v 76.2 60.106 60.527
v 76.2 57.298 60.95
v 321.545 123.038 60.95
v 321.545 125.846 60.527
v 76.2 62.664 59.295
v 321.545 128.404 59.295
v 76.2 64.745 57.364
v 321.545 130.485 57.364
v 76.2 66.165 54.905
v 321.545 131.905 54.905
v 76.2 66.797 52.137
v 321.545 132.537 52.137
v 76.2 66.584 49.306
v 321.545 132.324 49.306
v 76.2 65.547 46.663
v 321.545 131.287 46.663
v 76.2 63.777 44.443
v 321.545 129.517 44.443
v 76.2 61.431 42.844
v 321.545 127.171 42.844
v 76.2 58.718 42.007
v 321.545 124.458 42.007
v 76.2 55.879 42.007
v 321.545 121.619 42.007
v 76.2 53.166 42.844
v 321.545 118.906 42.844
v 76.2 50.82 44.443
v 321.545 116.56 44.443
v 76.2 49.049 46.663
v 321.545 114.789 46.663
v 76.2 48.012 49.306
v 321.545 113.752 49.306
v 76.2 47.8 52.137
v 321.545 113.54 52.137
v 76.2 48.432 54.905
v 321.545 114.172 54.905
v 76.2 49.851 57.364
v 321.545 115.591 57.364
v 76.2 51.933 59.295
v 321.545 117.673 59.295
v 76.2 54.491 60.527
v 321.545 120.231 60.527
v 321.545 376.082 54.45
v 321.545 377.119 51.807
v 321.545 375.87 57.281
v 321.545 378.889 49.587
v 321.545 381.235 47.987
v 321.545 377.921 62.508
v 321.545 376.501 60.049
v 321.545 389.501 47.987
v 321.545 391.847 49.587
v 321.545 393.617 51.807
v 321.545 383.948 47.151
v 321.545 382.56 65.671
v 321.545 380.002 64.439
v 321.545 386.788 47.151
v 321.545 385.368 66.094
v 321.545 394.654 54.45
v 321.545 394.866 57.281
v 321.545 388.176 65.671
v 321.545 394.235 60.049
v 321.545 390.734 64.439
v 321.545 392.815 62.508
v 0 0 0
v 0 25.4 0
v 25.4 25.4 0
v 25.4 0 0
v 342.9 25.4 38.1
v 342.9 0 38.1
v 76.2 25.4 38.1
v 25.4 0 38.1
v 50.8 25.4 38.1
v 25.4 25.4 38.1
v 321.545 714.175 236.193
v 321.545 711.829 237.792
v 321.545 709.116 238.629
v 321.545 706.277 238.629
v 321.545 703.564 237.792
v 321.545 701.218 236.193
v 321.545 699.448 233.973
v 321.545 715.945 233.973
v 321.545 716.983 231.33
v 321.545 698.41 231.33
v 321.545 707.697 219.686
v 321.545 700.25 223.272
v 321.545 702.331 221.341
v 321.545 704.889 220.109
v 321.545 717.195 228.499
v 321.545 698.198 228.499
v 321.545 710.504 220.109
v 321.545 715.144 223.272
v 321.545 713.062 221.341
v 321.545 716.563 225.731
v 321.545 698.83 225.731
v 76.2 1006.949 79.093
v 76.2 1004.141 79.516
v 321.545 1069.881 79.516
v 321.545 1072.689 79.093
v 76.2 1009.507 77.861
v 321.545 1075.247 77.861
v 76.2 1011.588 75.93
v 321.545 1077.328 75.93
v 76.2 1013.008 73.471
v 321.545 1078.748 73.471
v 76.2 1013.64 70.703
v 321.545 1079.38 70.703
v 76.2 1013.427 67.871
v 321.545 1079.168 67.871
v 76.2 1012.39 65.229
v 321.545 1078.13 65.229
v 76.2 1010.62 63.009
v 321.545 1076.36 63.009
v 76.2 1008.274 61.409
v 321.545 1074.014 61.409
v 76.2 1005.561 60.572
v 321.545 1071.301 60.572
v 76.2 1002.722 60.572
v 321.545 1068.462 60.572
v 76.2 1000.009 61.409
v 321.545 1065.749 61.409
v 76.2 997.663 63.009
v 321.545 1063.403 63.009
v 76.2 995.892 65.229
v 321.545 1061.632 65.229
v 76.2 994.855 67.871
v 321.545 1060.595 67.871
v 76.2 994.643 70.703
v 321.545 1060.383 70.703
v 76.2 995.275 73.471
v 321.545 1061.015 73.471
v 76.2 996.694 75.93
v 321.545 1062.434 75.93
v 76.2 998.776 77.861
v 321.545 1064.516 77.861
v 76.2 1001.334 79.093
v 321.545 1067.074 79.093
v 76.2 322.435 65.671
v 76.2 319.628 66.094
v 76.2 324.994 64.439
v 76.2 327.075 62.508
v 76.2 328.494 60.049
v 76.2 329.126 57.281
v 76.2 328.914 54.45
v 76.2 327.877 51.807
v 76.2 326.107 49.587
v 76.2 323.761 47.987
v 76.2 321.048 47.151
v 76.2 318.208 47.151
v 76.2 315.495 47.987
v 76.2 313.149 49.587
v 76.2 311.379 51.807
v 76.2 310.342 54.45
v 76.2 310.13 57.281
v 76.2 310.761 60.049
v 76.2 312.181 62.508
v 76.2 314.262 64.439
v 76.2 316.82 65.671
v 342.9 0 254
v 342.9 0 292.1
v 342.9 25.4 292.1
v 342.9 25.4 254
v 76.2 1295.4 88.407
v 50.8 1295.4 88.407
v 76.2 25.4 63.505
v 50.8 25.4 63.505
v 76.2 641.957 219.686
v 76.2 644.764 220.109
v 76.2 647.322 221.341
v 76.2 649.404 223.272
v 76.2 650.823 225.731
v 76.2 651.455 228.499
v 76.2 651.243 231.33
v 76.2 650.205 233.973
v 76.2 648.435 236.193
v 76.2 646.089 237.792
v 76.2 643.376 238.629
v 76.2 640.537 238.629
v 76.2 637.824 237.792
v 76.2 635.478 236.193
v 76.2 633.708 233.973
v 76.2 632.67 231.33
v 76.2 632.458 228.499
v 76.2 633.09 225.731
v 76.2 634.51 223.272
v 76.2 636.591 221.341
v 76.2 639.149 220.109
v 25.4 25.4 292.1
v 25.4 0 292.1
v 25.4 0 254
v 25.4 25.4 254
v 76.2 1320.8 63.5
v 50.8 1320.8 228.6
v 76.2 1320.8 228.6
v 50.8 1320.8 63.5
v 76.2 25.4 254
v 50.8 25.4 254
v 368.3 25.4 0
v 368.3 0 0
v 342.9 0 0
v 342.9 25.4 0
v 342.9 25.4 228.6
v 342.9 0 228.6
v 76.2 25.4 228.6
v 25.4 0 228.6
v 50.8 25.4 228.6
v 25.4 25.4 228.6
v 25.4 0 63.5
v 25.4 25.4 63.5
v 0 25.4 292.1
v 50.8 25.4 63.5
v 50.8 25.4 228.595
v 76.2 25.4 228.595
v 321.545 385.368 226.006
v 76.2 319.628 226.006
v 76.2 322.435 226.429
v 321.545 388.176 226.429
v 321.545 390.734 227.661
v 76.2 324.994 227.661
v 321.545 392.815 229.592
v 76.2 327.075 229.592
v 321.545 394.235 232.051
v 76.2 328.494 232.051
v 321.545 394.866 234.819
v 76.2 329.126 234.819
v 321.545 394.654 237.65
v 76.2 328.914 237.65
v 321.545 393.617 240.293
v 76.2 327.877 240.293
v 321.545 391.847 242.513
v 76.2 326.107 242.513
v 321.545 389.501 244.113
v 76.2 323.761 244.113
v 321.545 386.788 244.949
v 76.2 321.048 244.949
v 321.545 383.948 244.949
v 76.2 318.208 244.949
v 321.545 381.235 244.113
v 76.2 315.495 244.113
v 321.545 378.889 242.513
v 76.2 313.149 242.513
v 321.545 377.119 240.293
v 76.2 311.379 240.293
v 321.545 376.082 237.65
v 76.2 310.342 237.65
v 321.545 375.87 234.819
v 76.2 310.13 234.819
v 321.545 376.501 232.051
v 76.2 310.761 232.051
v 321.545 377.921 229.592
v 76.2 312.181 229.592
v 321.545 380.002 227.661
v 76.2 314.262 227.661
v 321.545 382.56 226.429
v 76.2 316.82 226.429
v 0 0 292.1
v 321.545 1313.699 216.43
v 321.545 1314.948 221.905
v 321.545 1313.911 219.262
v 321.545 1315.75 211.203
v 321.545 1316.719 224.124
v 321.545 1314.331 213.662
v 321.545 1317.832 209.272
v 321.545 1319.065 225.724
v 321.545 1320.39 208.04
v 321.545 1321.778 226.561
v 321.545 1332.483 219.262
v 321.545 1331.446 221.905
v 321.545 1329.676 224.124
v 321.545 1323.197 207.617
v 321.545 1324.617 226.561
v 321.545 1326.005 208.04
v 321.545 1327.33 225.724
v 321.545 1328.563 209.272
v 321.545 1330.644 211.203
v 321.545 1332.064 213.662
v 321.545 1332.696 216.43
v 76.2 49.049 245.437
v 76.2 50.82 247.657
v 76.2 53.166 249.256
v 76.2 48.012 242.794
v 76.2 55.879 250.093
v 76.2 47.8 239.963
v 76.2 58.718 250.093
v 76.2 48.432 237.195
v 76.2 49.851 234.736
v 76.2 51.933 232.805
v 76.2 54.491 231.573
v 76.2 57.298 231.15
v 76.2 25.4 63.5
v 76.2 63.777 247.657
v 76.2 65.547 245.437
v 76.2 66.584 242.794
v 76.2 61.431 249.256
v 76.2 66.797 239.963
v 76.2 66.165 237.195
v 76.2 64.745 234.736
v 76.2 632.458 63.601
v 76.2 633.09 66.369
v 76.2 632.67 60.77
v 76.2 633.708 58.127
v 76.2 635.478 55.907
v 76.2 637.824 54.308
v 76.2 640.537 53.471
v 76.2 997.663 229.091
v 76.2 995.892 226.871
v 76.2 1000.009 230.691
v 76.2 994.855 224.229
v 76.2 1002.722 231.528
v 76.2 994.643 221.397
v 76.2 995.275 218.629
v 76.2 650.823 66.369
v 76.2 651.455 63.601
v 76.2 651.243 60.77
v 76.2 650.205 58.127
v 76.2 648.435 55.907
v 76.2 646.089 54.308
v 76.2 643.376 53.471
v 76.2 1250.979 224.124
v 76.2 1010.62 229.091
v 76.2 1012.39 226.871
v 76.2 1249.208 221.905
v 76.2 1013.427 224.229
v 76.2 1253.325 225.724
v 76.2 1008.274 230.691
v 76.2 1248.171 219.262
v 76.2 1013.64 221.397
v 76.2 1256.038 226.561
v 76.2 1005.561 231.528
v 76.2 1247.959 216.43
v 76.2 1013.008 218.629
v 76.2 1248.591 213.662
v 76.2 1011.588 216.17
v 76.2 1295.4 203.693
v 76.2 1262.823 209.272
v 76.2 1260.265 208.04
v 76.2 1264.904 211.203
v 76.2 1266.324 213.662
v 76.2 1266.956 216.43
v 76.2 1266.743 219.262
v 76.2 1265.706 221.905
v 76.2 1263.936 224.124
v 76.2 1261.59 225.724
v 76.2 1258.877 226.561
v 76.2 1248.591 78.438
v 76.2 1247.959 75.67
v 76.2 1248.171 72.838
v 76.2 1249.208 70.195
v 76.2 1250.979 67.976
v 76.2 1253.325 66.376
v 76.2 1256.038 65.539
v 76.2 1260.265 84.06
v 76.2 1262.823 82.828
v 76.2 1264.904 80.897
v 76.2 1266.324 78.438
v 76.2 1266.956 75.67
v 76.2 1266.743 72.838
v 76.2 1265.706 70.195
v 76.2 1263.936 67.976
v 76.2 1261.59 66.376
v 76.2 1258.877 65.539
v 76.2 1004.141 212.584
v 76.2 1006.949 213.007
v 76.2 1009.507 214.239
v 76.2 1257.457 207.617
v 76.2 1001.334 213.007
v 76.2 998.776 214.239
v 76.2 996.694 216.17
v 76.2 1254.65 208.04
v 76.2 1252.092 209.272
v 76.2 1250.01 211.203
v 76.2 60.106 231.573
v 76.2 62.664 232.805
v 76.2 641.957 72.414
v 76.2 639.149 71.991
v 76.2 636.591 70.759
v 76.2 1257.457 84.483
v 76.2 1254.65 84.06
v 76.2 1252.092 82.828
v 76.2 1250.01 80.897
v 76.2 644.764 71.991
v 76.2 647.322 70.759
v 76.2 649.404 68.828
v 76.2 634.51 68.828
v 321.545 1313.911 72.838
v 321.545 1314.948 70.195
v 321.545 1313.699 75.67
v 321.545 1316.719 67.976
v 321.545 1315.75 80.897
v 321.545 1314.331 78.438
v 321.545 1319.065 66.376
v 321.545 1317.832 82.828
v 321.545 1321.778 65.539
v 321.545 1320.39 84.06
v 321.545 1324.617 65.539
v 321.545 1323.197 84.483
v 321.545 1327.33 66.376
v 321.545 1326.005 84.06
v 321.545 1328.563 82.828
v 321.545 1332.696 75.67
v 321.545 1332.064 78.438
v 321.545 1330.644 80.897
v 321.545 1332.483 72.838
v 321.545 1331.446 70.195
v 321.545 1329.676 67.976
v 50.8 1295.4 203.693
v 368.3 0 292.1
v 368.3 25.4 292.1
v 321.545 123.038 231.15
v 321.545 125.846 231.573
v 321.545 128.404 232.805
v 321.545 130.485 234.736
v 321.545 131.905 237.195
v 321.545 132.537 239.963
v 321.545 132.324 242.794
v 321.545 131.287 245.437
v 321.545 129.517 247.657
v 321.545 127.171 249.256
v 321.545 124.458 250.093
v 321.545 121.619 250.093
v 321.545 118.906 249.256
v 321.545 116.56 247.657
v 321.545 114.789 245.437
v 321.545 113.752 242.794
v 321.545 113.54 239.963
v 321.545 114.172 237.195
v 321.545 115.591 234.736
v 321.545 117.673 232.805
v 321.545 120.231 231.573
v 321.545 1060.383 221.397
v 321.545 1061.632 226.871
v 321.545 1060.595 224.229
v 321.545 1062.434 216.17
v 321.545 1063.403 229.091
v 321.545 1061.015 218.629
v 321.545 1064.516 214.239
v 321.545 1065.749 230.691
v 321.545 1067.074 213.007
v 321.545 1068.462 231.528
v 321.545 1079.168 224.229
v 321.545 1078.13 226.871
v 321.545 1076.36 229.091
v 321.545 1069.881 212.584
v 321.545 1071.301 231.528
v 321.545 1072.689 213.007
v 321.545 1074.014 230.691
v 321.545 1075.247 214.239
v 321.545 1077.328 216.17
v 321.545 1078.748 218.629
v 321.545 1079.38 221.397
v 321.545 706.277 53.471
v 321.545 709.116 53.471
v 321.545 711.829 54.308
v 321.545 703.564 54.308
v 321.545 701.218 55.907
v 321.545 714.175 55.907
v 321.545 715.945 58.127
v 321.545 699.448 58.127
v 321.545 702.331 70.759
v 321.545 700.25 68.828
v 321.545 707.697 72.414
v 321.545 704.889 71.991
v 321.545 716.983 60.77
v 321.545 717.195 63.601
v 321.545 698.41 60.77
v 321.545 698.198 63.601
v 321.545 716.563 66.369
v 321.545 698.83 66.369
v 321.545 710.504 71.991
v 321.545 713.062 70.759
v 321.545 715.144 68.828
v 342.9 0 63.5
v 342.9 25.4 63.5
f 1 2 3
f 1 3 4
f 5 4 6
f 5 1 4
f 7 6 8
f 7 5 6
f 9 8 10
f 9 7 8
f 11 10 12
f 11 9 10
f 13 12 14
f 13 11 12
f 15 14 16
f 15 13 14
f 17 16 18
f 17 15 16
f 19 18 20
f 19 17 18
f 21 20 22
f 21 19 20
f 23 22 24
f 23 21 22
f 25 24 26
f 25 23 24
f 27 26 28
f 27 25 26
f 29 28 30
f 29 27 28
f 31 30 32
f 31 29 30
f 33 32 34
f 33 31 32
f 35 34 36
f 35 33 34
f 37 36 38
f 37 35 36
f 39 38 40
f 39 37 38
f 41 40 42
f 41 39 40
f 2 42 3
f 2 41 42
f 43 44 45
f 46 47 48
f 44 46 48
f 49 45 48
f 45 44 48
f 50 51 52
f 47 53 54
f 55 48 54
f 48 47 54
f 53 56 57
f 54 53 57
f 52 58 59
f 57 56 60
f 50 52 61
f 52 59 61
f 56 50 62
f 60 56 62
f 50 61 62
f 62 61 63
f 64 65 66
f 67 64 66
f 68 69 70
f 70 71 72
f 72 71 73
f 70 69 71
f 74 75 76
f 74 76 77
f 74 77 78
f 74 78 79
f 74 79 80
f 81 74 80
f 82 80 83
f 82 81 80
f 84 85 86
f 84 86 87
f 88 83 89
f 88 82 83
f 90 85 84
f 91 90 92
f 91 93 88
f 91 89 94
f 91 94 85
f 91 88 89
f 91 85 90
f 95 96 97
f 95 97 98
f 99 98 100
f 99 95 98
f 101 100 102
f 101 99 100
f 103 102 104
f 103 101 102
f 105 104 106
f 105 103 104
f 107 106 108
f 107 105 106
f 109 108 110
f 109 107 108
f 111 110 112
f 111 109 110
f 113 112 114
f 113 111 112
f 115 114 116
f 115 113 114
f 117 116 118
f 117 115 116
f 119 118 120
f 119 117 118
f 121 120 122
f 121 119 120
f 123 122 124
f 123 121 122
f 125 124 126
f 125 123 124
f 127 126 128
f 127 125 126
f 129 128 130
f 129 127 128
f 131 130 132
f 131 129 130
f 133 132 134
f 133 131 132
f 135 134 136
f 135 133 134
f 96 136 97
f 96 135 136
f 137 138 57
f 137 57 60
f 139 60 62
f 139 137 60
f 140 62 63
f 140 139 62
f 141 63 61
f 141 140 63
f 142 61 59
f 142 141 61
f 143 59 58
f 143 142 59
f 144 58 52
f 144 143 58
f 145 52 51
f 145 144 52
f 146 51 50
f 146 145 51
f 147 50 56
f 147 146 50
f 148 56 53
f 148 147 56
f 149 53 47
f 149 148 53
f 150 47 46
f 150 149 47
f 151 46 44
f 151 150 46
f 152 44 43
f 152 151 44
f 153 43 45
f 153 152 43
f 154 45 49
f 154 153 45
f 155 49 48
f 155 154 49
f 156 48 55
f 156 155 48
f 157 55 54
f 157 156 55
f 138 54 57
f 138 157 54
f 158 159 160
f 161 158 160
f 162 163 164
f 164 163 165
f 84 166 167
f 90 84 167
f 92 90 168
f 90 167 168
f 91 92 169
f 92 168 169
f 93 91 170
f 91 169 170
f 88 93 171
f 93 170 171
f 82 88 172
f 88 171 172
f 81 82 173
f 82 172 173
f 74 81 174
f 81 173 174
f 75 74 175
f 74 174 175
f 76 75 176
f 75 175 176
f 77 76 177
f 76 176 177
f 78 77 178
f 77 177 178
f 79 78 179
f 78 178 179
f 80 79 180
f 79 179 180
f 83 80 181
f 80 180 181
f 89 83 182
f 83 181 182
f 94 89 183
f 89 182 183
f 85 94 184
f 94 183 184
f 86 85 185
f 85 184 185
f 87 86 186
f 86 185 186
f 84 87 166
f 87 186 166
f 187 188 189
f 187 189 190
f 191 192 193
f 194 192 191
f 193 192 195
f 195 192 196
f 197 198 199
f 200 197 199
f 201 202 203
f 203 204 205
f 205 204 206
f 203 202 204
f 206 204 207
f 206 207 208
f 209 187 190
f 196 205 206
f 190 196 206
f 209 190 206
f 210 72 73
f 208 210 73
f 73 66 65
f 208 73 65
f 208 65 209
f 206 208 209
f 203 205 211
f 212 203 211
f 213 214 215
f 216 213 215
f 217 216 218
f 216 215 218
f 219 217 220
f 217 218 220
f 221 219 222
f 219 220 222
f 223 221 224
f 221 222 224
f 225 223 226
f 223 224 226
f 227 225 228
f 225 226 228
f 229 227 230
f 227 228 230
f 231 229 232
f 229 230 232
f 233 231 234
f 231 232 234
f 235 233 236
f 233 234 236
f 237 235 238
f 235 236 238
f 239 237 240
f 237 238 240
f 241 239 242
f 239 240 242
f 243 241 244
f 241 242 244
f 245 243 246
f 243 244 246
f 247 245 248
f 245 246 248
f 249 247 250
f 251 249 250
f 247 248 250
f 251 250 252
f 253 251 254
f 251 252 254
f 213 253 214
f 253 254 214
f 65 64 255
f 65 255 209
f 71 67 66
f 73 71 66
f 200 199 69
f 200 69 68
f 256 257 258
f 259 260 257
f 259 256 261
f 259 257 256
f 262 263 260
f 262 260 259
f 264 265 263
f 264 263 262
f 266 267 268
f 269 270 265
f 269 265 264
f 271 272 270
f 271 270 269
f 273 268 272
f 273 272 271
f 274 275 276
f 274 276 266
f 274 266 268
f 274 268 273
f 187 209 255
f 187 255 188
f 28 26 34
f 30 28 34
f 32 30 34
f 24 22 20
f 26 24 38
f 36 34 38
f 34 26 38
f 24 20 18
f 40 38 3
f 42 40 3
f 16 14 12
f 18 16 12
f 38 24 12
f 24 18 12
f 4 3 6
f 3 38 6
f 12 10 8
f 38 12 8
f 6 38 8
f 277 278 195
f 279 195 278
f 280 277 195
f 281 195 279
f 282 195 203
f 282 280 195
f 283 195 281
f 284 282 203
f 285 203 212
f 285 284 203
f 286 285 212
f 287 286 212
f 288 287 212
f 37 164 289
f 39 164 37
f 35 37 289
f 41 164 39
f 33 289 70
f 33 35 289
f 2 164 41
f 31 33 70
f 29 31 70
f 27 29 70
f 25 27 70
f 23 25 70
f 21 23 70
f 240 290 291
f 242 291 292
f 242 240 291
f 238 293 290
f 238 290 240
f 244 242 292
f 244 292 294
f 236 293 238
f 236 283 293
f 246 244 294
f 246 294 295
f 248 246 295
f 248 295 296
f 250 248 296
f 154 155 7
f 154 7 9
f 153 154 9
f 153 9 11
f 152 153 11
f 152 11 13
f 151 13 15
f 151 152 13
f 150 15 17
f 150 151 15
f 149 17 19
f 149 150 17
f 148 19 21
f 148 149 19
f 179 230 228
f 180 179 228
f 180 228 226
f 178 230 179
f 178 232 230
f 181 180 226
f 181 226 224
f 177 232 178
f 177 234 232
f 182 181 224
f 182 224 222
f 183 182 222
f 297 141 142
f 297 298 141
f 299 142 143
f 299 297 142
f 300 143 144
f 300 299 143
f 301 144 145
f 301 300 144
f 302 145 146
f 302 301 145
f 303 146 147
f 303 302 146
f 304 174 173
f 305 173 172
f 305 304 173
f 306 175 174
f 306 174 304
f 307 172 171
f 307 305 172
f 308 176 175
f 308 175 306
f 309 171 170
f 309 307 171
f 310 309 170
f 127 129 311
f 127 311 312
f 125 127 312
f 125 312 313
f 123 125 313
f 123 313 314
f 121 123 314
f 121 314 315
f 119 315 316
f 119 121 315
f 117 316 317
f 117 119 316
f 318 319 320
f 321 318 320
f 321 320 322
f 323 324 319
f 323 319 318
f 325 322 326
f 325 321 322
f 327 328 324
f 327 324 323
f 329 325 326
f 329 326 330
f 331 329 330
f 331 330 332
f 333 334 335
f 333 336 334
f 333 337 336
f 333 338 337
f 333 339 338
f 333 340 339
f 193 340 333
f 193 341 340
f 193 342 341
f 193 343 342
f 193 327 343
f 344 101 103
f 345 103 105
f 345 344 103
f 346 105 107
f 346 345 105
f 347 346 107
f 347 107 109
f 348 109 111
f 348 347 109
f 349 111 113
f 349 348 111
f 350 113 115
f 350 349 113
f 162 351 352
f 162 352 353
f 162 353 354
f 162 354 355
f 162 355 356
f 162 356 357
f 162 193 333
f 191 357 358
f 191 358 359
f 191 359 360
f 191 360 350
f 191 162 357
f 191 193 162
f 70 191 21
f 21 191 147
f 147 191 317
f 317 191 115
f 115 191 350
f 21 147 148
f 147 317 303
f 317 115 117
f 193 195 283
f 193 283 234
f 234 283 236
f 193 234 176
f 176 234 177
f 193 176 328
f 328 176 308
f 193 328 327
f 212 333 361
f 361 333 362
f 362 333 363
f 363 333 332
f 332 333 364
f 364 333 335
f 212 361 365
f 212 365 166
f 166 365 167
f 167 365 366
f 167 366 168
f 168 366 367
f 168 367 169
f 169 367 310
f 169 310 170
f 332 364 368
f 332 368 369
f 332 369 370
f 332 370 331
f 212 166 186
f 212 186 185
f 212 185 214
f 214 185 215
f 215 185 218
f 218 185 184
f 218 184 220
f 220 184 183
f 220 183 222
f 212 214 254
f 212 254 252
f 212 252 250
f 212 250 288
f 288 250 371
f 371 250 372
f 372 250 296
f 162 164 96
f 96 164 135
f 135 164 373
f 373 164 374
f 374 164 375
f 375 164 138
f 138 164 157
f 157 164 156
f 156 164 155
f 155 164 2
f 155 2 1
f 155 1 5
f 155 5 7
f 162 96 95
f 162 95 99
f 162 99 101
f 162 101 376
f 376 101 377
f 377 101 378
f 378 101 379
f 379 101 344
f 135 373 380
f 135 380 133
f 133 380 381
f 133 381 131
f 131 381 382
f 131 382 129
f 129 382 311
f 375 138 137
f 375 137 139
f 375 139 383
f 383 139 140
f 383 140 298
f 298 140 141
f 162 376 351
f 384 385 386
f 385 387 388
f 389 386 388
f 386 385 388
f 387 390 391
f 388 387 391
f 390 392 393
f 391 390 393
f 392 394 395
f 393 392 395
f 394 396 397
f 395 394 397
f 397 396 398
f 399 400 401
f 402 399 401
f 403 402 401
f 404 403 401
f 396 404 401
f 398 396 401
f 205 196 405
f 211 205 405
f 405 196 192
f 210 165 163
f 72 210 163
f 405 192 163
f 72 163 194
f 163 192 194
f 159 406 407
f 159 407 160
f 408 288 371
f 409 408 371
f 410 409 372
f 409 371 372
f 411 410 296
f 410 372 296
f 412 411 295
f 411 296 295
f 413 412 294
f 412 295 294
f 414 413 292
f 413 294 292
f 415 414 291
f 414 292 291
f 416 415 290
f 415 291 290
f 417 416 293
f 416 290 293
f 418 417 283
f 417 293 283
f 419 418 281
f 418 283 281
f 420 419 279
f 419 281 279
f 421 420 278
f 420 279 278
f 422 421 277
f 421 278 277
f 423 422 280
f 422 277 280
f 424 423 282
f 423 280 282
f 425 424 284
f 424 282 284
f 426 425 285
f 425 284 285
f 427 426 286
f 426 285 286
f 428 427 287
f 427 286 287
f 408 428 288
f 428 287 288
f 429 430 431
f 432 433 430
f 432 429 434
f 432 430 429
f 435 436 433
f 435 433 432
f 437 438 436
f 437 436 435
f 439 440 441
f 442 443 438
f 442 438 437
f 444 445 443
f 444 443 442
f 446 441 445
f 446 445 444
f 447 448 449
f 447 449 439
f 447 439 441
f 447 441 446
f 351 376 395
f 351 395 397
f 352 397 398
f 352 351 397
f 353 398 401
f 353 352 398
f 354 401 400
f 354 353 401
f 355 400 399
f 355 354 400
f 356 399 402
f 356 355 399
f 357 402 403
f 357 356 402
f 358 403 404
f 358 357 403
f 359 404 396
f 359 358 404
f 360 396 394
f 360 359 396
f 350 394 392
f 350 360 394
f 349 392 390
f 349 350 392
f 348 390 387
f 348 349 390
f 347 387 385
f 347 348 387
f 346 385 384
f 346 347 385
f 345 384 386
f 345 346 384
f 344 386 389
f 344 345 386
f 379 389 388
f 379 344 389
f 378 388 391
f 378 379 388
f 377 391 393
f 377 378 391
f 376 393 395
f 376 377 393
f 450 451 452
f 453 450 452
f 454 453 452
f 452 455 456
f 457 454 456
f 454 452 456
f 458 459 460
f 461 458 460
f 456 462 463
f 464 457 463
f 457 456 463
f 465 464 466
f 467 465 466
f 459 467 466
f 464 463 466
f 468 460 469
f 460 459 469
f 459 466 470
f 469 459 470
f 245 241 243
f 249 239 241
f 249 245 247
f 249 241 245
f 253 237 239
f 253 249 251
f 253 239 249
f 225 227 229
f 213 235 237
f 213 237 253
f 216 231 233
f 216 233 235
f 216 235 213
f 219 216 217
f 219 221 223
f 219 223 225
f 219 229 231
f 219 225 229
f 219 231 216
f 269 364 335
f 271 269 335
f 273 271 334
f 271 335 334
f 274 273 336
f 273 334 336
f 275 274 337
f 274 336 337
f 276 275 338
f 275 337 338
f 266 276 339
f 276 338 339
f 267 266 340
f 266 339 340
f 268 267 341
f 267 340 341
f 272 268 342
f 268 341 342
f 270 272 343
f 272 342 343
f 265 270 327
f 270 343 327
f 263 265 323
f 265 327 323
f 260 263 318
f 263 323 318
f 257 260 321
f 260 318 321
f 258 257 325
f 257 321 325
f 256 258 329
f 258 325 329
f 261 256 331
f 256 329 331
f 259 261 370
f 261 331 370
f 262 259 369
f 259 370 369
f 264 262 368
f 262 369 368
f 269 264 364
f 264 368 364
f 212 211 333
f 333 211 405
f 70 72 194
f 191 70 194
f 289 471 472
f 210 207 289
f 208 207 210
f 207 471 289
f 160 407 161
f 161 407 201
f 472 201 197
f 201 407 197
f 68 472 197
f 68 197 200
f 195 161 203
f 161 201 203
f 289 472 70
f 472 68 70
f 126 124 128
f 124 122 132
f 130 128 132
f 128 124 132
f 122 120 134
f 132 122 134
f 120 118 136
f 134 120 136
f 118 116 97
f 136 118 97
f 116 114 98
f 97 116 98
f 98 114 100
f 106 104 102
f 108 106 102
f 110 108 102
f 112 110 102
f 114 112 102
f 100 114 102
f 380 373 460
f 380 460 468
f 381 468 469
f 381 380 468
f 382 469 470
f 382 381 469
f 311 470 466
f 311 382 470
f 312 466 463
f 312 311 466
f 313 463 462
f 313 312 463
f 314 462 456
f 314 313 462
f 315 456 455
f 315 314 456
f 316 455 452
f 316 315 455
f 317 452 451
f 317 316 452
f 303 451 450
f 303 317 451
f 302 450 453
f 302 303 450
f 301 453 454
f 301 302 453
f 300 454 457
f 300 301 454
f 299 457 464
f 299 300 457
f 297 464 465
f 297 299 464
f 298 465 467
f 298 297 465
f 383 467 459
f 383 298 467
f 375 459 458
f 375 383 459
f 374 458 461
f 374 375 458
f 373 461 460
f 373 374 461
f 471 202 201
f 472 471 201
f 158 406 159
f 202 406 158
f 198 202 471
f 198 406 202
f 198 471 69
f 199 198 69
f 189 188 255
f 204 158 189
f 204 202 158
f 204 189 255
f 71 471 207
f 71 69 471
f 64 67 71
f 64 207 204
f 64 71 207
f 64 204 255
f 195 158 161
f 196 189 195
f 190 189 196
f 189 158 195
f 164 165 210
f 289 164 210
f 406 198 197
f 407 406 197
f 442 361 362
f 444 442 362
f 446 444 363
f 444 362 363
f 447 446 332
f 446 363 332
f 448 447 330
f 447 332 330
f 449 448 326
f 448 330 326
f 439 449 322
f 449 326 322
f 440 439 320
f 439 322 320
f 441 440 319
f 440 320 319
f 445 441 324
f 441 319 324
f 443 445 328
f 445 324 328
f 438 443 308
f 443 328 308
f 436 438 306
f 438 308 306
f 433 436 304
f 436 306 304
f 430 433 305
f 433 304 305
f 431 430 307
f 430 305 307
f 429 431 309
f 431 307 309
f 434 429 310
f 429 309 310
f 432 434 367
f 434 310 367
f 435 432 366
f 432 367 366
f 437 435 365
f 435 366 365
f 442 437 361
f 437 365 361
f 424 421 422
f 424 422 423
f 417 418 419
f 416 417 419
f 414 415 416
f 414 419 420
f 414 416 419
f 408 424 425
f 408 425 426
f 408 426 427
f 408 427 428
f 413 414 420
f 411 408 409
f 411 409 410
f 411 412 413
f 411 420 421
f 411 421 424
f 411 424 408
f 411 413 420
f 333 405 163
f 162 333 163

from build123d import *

# Parameters (mm, degrees)
SKETCH1_W           = 25.4
SKETCH1_H           = 25.4
BOSS_EXTRUDE1_DEPTH = 292.1
SKETCH2_W           = 25.4
SKETCH2_H           = 25.4
BOSS_EXTRUDE2_DEPTH = 317.5
BOSS_EXTRUDE3_DEPTH = 25.4
SKETCH4_R           = 9.525
BOSS_EXTRUDE5_DEPTH = 254


with BuildPart() as part:
    # Sketch1 → Boss-Extrude1 (new body)
    with BuildSketch(Plane.XY):
        with Locations((12.7, 12.7)):
            Rectangle(SKETCH1_W, SKETCH1_H)
    boss_extrude1 = extrude(amount=BOSS_EXTRUDE1_DEPTH)

    # Sketch2 → Boss-Extrude2 (add)
    with BuildSketch(Plane(origin=(25.4, 0, 0), x_dir=(0, 0, -1), z_dir=(1, 0, 0))):
        with Locations((-241.3, 12.7)):
            Rectangle(SKETCH2_W, SKETCH2_H)
        with Locations((-50.8, 12.7)):
            Rectangle(SKETCH2_W, SKETCH2_H)
    extrude(amount=BOSS_EXTRUDE2_DEPTH)

    # Mirror1: Boss-Extrude1 across plane
    add(boss_extrude1.mirror(Plane(origin=(184.15, 0, 0), x_dir=(0, 0, 1), z_dir=(1, 0, 0))))

    # Sketch3 → Boss-Extrude3 (add)
    with BuildSketch(Plane.ZY.offset(-50.8)):
        Polygon((38.1, 25.4), (63.5, 1320.8), (88.904882268, 1320.8), (203.195117732, 1320.8), (228.6, 1320.8), (254, 25.4), (228.595117732, 25.4), (203.693156948, 1295.4), (88.406843052, 1295.4), (63.504882268, 25.4), align=None)
    extrude(amount=-BOSS_EXTRUDE3_DEPTH)

    # Sketch4 → Boss-Extrude5 (add, along a direction that is not the sketch's normal)
    with BuildSketch(Plane(origin=(76.2, 0, 0), x_dir=(0, 0, -1), z_dir=(1, 0, 0))):
        with Locations((-240.674544157, 57.298247998)):
            Circle(SKETCH4_R)
        with Locations((-235.530825048, 319.62792253)):
            Circle(SKETCH4_R)
        with Locations((-229.210655655, 641.956561596)):
            Circle(SKETCH4_R)
        with Locations((-217.142014813, 1257.457244551)):
            Circle(SKETCH4_R)
        with Locations((-222.108994477, 1004.141281654)):
            Circle(SKETCH4_R)
    boss_extrude5 = extrude(amount=BOSS_EXTRUDE5_DEPTH, dir=(0.9659258262890673, 0.2588190451025247, -2.638762530576281e-15))

    # Mirror2: Boss-Extrude5 across plane
    add(boss_extrude5.mirror(Plane.XY.offset(146.05)))


solid = part.part
